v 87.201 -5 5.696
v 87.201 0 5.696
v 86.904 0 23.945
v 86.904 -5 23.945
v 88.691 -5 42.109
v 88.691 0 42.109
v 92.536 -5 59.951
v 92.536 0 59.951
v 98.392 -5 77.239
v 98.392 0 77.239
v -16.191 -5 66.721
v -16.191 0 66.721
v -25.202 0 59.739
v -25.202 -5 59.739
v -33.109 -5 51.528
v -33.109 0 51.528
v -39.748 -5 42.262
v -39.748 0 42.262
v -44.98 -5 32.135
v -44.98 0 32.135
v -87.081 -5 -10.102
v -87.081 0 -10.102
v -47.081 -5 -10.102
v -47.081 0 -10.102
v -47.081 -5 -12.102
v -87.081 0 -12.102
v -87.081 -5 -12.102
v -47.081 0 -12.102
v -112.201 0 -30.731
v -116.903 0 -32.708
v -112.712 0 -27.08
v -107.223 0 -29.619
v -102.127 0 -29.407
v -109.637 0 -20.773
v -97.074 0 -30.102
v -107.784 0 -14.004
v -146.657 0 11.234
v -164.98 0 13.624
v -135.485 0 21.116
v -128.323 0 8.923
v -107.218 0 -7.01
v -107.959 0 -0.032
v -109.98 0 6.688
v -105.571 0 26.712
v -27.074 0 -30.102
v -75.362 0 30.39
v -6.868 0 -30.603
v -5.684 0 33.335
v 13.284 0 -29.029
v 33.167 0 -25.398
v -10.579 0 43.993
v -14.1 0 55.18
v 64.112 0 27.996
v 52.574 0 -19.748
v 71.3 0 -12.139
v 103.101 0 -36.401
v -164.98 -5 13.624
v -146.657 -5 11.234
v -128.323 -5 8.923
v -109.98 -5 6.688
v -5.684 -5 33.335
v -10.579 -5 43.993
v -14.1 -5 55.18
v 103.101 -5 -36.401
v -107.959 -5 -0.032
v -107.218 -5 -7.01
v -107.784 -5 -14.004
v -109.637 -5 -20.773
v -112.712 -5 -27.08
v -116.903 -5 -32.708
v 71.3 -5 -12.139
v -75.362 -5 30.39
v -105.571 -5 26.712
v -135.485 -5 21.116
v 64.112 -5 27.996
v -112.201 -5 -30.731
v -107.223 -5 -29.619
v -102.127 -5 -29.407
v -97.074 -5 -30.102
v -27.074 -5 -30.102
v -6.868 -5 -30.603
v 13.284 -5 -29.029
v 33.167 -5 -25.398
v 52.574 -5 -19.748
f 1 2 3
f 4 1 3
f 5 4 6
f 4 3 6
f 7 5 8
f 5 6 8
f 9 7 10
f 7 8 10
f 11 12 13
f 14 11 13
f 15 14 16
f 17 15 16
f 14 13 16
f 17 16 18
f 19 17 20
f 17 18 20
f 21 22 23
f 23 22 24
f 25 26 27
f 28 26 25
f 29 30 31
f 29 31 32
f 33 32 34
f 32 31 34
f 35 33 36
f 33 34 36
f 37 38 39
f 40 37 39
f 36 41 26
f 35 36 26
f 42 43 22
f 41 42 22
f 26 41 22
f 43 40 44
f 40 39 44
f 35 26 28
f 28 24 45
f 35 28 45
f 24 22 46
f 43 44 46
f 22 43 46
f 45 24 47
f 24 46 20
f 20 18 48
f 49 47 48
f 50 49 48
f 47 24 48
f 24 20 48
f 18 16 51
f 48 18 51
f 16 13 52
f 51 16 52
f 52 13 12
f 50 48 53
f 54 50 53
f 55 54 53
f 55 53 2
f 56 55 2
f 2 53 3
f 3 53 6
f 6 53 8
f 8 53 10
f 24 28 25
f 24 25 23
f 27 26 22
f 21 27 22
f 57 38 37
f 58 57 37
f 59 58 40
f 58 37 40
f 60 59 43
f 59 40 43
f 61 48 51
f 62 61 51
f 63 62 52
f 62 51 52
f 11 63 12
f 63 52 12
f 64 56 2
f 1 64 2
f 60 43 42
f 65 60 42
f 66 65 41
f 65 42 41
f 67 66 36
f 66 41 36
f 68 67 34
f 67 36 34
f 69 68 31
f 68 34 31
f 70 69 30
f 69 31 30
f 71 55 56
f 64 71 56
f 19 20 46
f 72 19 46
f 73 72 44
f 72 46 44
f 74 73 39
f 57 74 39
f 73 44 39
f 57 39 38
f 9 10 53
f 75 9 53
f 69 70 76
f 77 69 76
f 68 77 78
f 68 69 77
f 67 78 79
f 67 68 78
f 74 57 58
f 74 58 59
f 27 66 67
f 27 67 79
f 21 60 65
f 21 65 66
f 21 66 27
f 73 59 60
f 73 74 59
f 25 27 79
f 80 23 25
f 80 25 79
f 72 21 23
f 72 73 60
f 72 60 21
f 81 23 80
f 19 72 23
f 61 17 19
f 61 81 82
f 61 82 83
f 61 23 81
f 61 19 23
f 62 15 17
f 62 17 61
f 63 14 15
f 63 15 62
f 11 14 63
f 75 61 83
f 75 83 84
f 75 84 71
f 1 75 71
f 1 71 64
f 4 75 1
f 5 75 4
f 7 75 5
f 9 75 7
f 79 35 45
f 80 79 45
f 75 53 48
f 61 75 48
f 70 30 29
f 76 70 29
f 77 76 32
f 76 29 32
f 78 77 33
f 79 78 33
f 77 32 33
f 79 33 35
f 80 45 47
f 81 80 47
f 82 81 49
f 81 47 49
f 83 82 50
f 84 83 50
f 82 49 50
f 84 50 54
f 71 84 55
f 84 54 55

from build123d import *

# Parameters (mm, degrees)
F0_W     = 40
F0_H     = 2
F1_DEPTH = 5


with BuildPart() as f1:
    # F0 (on Front) → F1 (new body)
    with BuildSketch(Plane.XZ):
        with BuildLine():
            Line((64.111737, 27.99553), (-5.684315, 33.335119))
            ThreePointArc((-5.684315, 33.335119), (-12.51556, 49.531418), (-16.191208, 66.720822))
            ThreePointArc((-16.191208, 66.720822), (-33.109228, 51.528336), (-44.980059, 32.134667))
            ThreePointArc((-44.980059, 32.134667), (-105.571318, 26.711963), (-164.980059, 13.6235))
            ThreePointArc((-164.980059, 13.6235), (-137.491015, 10.068821), (-109.980059, 6.687917))
            ThreePointArc((-109.980059, 6.687917), (-107.784091, -14.004458), (-116.903277, -32.70839))
            ThreePointArc((-116.903277, -32.70839), (-107.223293, -29.61905), (-97.073786, -30.102378))
            Line((-97.073786, -30.102378), (-27.073786, -30.102378))
            ThreePointArc((-27.073786, -30.102378), (23.272059, -27.46882), (71.299644, -12.139407))
            Line((71.299644, -12.139407), (103.101424, -36.401451))
            Line((103.101424, -36.401451), (87.200534, 5.6956))
            ThreePointArc((87.200534, 5.6956), (88.69059, 42.109352), (98.391595, 77.238715))
            Line((98.391595, 77.238715), (64.111737, 27.99553))
        make_face()
        with Locations((-67.080881, -11.102378)):
            Rectangle(F0_W, F0_H, mode=Mode.SUBTRACT)
    extrude(amount=F1_DEPTH)


solid = f1.part
